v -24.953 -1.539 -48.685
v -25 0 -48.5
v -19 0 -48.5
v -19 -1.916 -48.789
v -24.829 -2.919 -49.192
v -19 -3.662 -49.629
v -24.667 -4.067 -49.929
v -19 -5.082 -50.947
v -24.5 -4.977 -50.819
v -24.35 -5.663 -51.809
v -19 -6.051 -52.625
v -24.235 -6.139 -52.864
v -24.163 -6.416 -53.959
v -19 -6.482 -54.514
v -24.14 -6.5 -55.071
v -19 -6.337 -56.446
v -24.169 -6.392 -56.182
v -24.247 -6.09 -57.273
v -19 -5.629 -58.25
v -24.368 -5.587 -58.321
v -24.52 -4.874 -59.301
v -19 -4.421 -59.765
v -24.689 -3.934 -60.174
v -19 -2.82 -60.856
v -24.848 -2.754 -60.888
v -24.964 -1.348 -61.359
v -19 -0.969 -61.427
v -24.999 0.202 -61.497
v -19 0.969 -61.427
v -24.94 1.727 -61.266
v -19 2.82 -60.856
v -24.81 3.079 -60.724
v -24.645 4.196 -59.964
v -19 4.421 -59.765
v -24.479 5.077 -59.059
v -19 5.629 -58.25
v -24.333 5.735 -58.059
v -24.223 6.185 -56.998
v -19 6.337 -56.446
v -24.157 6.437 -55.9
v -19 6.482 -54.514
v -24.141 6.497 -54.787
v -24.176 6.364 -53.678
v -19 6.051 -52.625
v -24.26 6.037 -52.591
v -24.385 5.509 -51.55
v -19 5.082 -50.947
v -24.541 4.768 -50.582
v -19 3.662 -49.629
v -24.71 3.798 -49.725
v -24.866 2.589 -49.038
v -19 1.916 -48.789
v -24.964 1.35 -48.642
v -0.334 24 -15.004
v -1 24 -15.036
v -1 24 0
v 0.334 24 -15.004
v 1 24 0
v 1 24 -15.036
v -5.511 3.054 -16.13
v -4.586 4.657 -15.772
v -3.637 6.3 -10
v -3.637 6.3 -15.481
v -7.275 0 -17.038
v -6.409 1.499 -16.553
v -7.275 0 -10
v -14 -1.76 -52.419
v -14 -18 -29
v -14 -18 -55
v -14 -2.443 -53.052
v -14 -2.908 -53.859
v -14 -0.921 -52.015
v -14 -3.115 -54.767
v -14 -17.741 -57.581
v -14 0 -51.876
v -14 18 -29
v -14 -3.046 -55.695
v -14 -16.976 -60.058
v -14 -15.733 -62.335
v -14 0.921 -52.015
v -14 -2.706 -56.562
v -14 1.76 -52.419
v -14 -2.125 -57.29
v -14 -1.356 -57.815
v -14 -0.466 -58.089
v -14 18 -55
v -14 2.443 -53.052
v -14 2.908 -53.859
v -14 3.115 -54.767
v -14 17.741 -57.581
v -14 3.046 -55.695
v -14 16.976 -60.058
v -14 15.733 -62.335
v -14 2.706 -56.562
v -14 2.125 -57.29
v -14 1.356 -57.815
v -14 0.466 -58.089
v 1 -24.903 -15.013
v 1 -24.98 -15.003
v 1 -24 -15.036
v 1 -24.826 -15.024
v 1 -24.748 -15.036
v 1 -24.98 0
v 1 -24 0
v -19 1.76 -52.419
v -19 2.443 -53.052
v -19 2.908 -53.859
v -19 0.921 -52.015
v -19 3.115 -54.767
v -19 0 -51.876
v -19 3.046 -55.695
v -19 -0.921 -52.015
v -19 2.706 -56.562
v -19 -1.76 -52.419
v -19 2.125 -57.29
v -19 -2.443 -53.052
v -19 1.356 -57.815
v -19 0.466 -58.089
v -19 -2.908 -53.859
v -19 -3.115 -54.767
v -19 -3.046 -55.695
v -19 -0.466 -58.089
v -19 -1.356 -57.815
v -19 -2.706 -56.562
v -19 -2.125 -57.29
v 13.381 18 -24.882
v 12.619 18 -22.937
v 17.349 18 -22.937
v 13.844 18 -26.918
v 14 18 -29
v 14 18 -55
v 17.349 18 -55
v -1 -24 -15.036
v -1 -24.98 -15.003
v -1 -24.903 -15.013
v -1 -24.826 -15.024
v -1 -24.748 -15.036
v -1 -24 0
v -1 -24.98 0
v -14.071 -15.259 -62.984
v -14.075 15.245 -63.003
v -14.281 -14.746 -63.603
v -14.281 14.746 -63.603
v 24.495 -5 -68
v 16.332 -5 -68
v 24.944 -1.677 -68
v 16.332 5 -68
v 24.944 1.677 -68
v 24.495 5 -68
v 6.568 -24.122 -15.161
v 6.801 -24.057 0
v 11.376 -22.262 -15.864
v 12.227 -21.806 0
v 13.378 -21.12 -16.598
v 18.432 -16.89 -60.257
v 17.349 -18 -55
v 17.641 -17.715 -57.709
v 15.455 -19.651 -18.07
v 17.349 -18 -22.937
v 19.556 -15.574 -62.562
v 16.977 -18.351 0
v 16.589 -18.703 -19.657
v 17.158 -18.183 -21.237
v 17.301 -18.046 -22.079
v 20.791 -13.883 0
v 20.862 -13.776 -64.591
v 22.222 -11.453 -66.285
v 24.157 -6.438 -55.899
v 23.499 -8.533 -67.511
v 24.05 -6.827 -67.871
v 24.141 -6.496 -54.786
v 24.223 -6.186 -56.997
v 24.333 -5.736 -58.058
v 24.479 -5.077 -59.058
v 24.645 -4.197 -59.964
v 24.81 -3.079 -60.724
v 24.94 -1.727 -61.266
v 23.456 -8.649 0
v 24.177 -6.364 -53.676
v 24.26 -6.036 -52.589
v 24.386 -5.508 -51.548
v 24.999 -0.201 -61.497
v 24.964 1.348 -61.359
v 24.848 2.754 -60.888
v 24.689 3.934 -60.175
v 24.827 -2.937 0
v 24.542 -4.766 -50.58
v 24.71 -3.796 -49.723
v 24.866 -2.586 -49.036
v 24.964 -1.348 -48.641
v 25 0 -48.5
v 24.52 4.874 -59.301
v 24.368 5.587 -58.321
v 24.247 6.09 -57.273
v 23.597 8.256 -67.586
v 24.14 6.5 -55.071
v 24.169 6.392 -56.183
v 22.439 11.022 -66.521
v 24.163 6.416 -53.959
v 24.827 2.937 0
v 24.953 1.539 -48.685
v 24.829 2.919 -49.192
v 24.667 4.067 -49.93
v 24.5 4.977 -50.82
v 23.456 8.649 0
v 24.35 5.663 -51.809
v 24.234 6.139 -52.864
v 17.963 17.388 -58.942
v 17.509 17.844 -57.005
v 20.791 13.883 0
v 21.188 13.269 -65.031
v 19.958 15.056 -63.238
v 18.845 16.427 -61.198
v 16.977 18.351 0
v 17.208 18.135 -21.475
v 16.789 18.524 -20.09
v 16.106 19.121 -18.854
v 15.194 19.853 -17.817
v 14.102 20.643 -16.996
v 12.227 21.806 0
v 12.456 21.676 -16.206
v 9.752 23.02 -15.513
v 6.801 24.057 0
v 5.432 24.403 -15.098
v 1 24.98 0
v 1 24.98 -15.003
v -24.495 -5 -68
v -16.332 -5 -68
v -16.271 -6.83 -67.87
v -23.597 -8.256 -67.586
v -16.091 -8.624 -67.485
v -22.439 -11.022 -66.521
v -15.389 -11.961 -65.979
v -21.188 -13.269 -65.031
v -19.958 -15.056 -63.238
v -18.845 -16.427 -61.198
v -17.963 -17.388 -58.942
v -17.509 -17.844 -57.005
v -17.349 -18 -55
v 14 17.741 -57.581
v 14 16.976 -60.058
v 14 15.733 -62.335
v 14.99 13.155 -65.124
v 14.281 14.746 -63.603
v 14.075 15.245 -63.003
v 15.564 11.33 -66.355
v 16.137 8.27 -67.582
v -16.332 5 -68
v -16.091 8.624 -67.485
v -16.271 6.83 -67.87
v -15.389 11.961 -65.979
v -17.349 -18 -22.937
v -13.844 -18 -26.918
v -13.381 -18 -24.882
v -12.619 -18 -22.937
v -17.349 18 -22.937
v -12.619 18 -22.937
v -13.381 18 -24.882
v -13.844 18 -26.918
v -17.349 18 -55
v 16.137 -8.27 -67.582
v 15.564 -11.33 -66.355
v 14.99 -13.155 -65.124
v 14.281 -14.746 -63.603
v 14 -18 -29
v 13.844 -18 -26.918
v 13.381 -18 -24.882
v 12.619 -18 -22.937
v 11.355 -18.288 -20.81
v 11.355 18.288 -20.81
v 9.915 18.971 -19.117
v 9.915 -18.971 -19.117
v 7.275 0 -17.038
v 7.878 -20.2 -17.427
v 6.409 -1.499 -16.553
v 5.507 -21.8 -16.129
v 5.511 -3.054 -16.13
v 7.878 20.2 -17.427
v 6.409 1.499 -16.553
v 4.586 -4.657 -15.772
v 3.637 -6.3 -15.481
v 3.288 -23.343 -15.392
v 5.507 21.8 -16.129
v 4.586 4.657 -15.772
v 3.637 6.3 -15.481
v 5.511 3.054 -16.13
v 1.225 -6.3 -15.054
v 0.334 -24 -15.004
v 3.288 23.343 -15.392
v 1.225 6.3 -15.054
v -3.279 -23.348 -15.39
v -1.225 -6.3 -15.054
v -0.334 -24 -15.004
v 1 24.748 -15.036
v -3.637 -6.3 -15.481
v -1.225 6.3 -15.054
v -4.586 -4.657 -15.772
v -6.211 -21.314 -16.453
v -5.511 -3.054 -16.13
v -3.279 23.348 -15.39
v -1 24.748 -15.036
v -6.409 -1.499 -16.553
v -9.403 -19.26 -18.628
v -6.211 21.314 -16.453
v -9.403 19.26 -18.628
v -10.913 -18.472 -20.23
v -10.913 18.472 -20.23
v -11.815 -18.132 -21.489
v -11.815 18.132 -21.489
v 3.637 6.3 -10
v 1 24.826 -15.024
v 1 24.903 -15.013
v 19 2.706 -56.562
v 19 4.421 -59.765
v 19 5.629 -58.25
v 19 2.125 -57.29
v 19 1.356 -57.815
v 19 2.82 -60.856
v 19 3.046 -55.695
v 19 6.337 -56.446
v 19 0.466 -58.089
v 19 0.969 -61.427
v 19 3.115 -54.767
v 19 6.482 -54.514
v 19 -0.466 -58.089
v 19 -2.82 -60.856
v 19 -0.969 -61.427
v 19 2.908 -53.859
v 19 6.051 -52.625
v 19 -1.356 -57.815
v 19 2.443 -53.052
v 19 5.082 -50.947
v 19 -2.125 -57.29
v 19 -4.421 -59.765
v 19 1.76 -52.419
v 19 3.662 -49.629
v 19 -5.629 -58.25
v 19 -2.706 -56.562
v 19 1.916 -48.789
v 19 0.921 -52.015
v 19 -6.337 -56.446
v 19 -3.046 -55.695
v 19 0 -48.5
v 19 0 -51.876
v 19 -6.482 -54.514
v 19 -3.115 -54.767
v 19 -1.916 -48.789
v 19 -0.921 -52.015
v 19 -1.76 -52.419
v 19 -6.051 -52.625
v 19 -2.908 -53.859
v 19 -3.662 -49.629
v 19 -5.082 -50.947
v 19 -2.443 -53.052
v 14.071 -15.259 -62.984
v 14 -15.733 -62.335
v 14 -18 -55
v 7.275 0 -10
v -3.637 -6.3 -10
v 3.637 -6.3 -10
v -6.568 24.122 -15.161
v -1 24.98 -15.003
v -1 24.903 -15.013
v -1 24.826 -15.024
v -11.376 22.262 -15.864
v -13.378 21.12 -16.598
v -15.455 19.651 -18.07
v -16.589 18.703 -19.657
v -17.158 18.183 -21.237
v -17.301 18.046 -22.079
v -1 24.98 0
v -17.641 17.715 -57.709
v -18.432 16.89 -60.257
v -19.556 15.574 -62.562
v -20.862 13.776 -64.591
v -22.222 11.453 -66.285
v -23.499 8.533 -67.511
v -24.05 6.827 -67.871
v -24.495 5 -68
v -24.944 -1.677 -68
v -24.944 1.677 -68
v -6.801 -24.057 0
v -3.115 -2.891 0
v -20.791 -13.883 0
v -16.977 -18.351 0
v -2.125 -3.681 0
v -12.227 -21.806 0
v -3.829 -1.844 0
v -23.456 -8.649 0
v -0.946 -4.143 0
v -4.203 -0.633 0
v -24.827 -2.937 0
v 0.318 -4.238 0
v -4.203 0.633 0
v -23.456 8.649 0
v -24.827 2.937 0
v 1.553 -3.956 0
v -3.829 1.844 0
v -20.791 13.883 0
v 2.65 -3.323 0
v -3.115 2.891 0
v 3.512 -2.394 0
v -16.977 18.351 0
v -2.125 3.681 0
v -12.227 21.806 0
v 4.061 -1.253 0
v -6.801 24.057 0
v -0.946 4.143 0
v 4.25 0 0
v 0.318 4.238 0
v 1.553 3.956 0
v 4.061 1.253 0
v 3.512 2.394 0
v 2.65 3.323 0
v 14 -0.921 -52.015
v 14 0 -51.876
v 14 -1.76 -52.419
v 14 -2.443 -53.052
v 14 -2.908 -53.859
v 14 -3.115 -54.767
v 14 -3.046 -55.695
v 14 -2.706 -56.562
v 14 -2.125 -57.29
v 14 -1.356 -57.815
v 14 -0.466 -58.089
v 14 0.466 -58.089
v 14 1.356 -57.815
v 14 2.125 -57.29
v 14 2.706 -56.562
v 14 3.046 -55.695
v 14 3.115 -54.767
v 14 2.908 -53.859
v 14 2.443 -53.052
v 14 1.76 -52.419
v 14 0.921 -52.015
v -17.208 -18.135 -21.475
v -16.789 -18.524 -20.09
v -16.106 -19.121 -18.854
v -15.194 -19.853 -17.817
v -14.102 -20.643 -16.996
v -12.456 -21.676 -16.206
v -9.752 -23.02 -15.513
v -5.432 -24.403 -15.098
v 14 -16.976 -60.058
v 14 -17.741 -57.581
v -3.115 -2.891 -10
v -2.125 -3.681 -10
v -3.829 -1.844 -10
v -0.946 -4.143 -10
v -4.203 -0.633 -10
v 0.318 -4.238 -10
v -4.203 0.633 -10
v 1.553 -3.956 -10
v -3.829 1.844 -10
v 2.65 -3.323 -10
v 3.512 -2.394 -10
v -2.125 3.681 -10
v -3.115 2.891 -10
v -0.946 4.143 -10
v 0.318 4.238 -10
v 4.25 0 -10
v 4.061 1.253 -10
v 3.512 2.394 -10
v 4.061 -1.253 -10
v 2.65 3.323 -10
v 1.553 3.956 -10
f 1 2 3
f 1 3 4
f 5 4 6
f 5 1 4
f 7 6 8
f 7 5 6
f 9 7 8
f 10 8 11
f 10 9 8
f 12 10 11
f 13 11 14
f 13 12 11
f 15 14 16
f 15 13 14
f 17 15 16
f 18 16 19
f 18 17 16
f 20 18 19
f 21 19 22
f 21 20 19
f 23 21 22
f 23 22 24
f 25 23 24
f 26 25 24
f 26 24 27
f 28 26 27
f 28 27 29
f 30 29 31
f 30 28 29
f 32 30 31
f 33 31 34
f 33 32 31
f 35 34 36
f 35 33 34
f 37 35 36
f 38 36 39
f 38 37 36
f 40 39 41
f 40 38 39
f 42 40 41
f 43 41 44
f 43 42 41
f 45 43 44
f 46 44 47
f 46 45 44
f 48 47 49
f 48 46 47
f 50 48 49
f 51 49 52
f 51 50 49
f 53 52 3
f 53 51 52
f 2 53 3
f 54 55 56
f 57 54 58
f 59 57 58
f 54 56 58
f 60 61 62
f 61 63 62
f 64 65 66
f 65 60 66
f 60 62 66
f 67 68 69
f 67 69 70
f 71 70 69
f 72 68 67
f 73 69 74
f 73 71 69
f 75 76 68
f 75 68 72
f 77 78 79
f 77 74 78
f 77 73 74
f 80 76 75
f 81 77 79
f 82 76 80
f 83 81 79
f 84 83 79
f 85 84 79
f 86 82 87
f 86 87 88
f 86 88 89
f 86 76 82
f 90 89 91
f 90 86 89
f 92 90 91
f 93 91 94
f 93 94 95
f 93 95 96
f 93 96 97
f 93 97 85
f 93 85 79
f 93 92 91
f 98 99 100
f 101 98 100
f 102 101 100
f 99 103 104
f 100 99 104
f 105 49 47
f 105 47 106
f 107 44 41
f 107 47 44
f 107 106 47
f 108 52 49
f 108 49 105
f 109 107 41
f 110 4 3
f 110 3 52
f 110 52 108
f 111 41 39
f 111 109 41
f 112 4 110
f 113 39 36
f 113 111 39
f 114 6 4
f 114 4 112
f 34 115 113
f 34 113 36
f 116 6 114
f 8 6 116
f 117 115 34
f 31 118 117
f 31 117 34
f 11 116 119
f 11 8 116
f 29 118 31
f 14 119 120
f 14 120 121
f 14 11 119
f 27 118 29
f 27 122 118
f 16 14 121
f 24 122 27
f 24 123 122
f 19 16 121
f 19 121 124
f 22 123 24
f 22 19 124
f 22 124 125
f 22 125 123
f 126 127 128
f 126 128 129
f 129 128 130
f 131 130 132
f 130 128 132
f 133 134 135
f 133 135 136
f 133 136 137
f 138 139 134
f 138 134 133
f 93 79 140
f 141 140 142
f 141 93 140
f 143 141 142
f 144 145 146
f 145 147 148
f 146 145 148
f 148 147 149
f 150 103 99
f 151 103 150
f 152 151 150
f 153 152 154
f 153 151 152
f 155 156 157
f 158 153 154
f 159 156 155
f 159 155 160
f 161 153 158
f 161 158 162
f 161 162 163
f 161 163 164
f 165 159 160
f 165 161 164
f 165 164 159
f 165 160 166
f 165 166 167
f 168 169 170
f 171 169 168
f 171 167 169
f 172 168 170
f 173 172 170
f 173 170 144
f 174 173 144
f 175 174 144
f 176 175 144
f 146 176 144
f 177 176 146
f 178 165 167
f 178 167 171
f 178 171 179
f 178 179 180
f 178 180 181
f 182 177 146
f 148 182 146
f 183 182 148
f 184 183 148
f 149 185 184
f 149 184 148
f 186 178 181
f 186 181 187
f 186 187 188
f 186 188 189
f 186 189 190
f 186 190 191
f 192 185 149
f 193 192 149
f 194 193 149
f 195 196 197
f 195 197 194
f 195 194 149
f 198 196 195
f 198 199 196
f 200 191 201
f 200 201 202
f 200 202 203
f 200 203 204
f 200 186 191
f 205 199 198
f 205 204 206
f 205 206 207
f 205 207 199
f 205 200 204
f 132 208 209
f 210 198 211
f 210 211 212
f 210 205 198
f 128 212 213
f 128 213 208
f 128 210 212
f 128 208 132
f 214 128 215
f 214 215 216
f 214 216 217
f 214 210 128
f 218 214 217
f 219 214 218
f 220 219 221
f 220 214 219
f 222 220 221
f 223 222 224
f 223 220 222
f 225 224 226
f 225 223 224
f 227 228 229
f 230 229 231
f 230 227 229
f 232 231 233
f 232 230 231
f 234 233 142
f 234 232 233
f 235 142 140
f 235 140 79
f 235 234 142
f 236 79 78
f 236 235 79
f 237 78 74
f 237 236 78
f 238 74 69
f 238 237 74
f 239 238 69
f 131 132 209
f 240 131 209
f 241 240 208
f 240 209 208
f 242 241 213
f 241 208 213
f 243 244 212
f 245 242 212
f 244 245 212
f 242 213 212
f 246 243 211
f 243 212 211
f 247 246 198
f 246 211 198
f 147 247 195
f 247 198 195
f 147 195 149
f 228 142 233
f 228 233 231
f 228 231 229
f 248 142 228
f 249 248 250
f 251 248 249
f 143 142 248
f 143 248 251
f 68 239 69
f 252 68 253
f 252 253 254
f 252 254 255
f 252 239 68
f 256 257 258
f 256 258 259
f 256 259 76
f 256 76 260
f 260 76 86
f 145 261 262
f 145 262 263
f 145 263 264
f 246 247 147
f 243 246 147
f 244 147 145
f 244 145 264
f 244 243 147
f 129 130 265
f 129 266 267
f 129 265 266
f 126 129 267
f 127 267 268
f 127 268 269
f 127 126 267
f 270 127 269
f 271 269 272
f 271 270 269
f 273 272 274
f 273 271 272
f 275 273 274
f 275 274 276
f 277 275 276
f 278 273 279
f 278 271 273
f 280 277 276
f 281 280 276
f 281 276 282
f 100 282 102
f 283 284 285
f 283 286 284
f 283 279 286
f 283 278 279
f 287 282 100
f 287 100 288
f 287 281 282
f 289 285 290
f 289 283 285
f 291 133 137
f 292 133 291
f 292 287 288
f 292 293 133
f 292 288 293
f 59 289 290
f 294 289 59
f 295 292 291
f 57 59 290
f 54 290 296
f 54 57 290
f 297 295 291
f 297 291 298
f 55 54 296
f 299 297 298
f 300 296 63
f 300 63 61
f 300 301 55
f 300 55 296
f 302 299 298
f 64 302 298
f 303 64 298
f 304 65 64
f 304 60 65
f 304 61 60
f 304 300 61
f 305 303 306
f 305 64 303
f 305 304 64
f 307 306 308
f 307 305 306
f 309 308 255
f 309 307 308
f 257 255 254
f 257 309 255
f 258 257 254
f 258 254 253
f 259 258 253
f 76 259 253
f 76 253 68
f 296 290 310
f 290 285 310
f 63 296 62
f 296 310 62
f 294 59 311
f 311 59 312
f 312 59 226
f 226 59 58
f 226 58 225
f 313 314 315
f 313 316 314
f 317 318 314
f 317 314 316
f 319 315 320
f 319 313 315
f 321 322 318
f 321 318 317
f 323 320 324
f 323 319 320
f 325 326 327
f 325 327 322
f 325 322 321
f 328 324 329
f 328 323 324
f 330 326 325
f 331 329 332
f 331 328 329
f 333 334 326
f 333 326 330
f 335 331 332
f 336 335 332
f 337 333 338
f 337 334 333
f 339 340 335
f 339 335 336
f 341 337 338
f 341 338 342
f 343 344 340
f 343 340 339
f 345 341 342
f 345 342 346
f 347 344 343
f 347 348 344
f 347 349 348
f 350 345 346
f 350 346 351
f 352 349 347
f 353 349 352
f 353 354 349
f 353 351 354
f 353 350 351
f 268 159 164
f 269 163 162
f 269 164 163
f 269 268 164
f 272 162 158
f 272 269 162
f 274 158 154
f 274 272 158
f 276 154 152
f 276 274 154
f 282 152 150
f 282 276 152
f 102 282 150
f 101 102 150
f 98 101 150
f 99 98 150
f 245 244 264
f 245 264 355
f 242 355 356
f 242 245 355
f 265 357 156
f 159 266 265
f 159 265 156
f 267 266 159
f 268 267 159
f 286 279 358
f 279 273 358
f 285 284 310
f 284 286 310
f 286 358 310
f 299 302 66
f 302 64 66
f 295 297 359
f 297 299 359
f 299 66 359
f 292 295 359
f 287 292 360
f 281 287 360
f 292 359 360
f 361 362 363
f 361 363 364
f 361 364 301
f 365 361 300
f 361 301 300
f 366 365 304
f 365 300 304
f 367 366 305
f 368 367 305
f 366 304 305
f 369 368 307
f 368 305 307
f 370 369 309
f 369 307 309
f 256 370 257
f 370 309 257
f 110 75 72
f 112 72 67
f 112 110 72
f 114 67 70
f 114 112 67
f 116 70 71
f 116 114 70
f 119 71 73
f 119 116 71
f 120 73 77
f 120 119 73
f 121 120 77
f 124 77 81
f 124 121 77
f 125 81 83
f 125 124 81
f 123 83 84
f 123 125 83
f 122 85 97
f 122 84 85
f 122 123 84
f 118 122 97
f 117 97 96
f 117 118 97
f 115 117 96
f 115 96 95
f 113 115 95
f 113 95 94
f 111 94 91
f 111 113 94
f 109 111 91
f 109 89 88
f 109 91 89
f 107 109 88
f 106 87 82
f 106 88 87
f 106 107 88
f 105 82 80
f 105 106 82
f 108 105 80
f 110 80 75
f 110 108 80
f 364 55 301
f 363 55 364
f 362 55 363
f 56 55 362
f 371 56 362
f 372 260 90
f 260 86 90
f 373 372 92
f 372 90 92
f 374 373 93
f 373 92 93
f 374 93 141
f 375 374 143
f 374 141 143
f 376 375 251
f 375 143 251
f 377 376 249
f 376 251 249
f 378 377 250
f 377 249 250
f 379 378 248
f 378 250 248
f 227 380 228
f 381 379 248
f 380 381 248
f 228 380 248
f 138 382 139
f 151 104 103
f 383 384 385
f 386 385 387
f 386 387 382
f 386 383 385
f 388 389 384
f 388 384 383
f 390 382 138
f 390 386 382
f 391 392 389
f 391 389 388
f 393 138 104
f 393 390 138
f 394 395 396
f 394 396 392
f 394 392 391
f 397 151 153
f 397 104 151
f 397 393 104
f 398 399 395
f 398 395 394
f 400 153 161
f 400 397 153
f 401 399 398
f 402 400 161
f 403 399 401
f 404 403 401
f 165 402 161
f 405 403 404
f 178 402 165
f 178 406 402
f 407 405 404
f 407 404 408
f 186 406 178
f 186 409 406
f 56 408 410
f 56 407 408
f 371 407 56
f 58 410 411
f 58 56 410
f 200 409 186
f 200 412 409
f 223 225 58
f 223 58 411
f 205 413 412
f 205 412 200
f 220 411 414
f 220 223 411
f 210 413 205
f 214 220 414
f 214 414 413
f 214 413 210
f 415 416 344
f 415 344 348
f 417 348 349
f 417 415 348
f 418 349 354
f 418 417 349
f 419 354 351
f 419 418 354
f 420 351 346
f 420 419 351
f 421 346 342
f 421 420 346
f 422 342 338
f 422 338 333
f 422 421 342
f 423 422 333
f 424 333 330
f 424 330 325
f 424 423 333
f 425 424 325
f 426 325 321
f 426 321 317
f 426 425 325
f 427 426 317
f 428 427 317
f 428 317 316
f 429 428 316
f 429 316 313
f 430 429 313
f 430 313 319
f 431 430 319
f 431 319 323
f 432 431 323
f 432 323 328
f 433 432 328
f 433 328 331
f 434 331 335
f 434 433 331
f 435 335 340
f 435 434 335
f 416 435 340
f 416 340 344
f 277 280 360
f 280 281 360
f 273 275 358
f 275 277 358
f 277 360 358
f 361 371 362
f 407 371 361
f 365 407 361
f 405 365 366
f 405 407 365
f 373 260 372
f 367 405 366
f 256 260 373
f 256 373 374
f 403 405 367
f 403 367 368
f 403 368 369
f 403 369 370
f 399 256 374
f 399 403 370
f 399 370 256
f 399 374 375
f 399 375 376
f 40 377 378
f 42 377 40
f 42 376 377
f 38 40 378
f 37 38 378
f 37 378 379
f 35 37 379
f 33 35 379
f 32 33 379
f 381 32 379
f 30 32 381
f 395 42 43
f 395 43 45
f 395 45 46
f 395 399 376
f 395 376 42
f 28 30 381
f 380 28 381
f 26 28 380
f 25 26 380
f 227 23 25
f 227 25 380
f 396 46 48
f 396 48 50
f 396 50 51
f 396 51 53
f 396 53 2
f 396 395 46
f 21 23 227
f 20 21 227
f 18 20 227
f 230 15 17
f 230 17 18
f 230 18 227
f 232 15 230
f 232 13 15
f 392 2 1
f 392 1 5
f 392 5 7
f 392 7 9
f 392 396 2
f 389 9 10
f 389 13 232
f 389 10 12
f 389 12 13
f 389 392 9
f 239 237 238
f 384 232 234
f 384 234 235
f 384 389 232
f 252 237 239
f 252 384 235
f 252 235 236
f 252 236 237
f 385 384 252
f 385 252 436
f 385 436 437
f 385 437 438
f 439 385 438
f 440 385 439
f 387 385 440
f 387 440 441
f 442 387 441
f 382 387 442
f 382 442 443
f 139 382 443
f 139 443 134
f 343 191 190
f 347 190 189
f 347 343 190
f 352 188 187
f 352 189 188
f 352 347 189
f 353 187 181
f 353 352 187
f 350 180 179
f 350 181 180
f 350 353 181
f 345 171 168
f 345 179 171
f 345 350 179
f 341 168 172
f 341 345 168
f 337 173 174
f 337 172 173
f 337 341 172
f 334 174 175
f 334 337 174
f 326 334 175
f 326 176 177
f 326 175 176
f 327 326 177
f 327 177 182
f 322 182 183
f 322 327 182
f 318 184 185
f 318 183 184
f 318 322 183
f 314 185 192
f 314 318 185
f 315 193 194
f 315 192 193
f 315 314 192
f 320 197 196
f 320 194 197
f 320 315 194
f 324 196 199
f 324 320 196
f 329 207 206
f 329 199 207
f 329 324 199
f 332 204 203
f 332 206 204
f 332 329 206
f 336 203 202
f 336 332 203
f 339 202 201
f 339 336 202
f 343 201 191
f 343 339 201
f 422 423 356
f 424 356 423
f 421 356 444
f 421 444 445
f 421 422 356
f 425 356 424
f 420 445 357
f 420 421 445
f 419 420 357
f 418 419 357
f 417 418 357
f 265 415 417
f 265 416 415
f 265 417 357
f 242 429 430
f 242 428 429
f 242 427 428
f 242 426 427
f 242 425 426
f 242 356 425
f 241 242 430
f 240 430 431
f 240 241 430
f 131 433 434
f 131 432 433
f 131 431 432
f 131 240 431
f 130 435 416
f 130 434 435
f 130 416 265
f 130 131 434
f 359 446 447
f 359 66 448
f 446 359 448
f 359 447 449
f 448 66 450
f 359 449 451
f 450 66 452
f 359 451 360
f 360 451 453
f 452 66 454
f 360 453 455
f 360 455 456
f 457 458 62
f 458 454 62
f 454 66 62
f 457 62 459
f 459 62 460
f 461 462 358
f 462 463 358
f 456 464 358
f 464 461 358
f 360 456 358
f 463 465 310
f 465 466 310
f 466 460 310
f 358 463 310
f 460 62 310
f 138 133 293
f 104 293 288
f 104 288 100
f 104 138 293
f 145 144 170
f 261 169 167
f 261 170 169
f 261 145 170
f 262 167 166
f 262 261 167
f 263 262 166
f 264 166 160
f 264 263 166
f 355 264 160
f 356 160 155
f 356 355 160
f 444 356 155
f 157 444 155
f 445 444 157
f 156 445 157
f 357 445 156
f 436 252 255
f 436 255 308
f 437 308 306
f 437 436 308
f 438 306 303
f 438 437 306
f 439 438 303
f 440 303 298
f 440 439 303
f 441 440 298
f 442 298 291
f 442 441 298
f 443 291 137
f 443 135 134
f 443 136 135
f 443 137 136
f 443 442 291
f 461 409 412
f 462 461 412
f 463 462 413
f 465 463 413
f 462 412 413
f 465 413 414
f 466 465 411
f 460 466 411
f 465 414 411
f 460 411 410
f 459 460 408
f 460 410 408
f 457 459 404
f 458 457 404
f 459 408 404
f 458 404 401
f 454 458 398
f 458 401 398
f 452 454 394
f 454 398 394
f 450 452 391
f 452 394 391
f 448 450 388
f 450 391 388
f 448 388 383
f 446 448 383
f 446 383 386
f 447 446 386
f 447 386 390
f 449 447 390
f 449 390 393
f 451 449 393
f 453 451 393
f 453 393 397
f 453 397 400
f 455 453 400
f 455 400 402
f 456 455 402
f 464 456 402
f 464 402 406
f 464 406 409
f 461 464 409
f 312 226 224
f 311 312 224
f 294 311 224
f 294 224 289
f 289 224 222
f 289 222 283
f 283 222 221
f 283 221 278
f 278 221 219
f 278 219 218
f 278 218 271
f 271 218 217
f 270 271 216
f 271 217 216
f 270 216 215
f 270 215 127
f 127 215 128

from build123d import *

# Parameters (mm, degrees)
F0_R          = 25
F1_DEPTH      = 68
F3_DEPTH      = 25.001
F3_DEPTH_BACK = 25.001
F5_DEPTH      = 25.0010001
F5_DEPTH_BACK = 25.0010001
F8_R          = 4.25
F9_DEPTH      = 25
F12_DEPTH     = 10
F13_W         = 2
F13_H         = 2
F14_DEPTH     = 25


with BuildPart() as f1:
    # F0 (on Top) → F1 (new body)
    with BuildSketch(Plane.XY):
        Circle(F0_R)
    extrude(amount=-F1_DEPTH)

    # F2 (on Right) → F3 (cut, two sides)
    with BuildSketch(Plane.YZ) as f3_sk:
        with BuildLine():
            Line((-25, -15), (-28, -15))
            Line((-28, -15), (-28, -73))
            Line((-28, -73), (0, -73))
            Line((0, -73), (28, -73))
            Line((28, -73), (28, -15))
            Line((28, -15), (25, -15))
            ThreePointArc((25, -15), (20, -17.6457513111), (18, -22.9372539332))
            Line((18, -22.9372539332), (18, -55))
            ThreePointArc((18, -55), (14.1923881554, -64.1923881554), (5, -68))
            Line((5, -68), (0, -68))
            Line((0, -68), (-5, -68))
            ThreePointArc((-5, -68), (-14.1923881554, -64.1923881554), (-18, -55))
            Line((-18, -55), (-18, -22.9372539332))
            ThreePointArc((-18, -22.9372539332), (-20, -17.6457513111), (-25, -15))
        make_face()
    extrude(amount=-F3_DEPTH, mode=Mode.SUBTRACT)
    extrude(f3_sk.sketch, amount=F3_DEPTH_BACK, mode=Mode.SUBTRACT)

    # F4 (on Front) → F5 (cut, two sides)
    with BuildSketch(Plane.XZ) as f5_sk:
        with BuildLine():
            Line((14, -62.3349160121), (14, -29))
            ThreePointArc((14, -29), (0, -15), (-14, -29))
            Line((-14, -29), (-14, -62.3349160121))
            ThreePointArc((-14, -62.3349160121), (-14.0711119786, -62.9842348539), (-14.2810766389, -63.6027707973))
            Line((-14.2810766389, -63.6027707973), (-16.3315382908, -68))
            Line((-16.3315382908, -68), (16.3315382908, -68))
            Line((16.3315382908, -68), (14.2810766389, -63.6027707973))
            ThreePointArc((14.2810766389, -63.6027707973), (14.0711119786, -62.9842348539), (14, -62.3349160121))
        make_face()
    extrude(amount=-F5_DEPTH, mode=Mode.SUBTRACT)
    extrude(f5_sk.sketch, amount=F5_DEPTH_BACK, mode=Mode.SUBTRACT)

    # F6 (on Front) → F7 (revolve, cut)
    with BuildSketch(Plane.XZ):
        Polygon((-19, -48.5), (-26, -48.5), (-26, -55), (0, -55), (26, -55), (26, -48.5), (19, -48.5), (19, -51.8758), (0, -51.8758), (-19, -51.8758), align=None)
    revolve(axis=Axis((0.0713579357, 0, -55), (1, 0, 0)), mode=Mode.SUBTRACT)

    # F8 (on face) → F9 (cut)
    with BuildSketch(Plane.XY):
        Circle(F8_R)
    extrude(amount=-F9_DEPTH, mode=Mode.SUBTRACT)

    # F11 (on offset) → F12 (cut)
    with BuildSketch(Plane.XY.offset(-10)):
        Polygon((3.6373066959, -6.3), (7.2746133918, 0), (3.6373066959, 6.3), (-3.6373066959, 6.3), (-7.2746133918, 0), (-3.6373066959, -6.3), align=None)
    extrude(amount=-F12_DEPTH, mode=Mode.SUBTRACT)

    # F13 (on face) → F14 (cut)
    with BuildSketch(Plane.XY):
        with Locations((0, 25)):
            Rectangle(F13_W, F13_H)
        with Locations((0, -25)):
            Rectangle(F13_W, F13_H)
    extrude(amount=-F14_DEPTH, mode=Mode.SUBTRACT)


solid = f1.part
